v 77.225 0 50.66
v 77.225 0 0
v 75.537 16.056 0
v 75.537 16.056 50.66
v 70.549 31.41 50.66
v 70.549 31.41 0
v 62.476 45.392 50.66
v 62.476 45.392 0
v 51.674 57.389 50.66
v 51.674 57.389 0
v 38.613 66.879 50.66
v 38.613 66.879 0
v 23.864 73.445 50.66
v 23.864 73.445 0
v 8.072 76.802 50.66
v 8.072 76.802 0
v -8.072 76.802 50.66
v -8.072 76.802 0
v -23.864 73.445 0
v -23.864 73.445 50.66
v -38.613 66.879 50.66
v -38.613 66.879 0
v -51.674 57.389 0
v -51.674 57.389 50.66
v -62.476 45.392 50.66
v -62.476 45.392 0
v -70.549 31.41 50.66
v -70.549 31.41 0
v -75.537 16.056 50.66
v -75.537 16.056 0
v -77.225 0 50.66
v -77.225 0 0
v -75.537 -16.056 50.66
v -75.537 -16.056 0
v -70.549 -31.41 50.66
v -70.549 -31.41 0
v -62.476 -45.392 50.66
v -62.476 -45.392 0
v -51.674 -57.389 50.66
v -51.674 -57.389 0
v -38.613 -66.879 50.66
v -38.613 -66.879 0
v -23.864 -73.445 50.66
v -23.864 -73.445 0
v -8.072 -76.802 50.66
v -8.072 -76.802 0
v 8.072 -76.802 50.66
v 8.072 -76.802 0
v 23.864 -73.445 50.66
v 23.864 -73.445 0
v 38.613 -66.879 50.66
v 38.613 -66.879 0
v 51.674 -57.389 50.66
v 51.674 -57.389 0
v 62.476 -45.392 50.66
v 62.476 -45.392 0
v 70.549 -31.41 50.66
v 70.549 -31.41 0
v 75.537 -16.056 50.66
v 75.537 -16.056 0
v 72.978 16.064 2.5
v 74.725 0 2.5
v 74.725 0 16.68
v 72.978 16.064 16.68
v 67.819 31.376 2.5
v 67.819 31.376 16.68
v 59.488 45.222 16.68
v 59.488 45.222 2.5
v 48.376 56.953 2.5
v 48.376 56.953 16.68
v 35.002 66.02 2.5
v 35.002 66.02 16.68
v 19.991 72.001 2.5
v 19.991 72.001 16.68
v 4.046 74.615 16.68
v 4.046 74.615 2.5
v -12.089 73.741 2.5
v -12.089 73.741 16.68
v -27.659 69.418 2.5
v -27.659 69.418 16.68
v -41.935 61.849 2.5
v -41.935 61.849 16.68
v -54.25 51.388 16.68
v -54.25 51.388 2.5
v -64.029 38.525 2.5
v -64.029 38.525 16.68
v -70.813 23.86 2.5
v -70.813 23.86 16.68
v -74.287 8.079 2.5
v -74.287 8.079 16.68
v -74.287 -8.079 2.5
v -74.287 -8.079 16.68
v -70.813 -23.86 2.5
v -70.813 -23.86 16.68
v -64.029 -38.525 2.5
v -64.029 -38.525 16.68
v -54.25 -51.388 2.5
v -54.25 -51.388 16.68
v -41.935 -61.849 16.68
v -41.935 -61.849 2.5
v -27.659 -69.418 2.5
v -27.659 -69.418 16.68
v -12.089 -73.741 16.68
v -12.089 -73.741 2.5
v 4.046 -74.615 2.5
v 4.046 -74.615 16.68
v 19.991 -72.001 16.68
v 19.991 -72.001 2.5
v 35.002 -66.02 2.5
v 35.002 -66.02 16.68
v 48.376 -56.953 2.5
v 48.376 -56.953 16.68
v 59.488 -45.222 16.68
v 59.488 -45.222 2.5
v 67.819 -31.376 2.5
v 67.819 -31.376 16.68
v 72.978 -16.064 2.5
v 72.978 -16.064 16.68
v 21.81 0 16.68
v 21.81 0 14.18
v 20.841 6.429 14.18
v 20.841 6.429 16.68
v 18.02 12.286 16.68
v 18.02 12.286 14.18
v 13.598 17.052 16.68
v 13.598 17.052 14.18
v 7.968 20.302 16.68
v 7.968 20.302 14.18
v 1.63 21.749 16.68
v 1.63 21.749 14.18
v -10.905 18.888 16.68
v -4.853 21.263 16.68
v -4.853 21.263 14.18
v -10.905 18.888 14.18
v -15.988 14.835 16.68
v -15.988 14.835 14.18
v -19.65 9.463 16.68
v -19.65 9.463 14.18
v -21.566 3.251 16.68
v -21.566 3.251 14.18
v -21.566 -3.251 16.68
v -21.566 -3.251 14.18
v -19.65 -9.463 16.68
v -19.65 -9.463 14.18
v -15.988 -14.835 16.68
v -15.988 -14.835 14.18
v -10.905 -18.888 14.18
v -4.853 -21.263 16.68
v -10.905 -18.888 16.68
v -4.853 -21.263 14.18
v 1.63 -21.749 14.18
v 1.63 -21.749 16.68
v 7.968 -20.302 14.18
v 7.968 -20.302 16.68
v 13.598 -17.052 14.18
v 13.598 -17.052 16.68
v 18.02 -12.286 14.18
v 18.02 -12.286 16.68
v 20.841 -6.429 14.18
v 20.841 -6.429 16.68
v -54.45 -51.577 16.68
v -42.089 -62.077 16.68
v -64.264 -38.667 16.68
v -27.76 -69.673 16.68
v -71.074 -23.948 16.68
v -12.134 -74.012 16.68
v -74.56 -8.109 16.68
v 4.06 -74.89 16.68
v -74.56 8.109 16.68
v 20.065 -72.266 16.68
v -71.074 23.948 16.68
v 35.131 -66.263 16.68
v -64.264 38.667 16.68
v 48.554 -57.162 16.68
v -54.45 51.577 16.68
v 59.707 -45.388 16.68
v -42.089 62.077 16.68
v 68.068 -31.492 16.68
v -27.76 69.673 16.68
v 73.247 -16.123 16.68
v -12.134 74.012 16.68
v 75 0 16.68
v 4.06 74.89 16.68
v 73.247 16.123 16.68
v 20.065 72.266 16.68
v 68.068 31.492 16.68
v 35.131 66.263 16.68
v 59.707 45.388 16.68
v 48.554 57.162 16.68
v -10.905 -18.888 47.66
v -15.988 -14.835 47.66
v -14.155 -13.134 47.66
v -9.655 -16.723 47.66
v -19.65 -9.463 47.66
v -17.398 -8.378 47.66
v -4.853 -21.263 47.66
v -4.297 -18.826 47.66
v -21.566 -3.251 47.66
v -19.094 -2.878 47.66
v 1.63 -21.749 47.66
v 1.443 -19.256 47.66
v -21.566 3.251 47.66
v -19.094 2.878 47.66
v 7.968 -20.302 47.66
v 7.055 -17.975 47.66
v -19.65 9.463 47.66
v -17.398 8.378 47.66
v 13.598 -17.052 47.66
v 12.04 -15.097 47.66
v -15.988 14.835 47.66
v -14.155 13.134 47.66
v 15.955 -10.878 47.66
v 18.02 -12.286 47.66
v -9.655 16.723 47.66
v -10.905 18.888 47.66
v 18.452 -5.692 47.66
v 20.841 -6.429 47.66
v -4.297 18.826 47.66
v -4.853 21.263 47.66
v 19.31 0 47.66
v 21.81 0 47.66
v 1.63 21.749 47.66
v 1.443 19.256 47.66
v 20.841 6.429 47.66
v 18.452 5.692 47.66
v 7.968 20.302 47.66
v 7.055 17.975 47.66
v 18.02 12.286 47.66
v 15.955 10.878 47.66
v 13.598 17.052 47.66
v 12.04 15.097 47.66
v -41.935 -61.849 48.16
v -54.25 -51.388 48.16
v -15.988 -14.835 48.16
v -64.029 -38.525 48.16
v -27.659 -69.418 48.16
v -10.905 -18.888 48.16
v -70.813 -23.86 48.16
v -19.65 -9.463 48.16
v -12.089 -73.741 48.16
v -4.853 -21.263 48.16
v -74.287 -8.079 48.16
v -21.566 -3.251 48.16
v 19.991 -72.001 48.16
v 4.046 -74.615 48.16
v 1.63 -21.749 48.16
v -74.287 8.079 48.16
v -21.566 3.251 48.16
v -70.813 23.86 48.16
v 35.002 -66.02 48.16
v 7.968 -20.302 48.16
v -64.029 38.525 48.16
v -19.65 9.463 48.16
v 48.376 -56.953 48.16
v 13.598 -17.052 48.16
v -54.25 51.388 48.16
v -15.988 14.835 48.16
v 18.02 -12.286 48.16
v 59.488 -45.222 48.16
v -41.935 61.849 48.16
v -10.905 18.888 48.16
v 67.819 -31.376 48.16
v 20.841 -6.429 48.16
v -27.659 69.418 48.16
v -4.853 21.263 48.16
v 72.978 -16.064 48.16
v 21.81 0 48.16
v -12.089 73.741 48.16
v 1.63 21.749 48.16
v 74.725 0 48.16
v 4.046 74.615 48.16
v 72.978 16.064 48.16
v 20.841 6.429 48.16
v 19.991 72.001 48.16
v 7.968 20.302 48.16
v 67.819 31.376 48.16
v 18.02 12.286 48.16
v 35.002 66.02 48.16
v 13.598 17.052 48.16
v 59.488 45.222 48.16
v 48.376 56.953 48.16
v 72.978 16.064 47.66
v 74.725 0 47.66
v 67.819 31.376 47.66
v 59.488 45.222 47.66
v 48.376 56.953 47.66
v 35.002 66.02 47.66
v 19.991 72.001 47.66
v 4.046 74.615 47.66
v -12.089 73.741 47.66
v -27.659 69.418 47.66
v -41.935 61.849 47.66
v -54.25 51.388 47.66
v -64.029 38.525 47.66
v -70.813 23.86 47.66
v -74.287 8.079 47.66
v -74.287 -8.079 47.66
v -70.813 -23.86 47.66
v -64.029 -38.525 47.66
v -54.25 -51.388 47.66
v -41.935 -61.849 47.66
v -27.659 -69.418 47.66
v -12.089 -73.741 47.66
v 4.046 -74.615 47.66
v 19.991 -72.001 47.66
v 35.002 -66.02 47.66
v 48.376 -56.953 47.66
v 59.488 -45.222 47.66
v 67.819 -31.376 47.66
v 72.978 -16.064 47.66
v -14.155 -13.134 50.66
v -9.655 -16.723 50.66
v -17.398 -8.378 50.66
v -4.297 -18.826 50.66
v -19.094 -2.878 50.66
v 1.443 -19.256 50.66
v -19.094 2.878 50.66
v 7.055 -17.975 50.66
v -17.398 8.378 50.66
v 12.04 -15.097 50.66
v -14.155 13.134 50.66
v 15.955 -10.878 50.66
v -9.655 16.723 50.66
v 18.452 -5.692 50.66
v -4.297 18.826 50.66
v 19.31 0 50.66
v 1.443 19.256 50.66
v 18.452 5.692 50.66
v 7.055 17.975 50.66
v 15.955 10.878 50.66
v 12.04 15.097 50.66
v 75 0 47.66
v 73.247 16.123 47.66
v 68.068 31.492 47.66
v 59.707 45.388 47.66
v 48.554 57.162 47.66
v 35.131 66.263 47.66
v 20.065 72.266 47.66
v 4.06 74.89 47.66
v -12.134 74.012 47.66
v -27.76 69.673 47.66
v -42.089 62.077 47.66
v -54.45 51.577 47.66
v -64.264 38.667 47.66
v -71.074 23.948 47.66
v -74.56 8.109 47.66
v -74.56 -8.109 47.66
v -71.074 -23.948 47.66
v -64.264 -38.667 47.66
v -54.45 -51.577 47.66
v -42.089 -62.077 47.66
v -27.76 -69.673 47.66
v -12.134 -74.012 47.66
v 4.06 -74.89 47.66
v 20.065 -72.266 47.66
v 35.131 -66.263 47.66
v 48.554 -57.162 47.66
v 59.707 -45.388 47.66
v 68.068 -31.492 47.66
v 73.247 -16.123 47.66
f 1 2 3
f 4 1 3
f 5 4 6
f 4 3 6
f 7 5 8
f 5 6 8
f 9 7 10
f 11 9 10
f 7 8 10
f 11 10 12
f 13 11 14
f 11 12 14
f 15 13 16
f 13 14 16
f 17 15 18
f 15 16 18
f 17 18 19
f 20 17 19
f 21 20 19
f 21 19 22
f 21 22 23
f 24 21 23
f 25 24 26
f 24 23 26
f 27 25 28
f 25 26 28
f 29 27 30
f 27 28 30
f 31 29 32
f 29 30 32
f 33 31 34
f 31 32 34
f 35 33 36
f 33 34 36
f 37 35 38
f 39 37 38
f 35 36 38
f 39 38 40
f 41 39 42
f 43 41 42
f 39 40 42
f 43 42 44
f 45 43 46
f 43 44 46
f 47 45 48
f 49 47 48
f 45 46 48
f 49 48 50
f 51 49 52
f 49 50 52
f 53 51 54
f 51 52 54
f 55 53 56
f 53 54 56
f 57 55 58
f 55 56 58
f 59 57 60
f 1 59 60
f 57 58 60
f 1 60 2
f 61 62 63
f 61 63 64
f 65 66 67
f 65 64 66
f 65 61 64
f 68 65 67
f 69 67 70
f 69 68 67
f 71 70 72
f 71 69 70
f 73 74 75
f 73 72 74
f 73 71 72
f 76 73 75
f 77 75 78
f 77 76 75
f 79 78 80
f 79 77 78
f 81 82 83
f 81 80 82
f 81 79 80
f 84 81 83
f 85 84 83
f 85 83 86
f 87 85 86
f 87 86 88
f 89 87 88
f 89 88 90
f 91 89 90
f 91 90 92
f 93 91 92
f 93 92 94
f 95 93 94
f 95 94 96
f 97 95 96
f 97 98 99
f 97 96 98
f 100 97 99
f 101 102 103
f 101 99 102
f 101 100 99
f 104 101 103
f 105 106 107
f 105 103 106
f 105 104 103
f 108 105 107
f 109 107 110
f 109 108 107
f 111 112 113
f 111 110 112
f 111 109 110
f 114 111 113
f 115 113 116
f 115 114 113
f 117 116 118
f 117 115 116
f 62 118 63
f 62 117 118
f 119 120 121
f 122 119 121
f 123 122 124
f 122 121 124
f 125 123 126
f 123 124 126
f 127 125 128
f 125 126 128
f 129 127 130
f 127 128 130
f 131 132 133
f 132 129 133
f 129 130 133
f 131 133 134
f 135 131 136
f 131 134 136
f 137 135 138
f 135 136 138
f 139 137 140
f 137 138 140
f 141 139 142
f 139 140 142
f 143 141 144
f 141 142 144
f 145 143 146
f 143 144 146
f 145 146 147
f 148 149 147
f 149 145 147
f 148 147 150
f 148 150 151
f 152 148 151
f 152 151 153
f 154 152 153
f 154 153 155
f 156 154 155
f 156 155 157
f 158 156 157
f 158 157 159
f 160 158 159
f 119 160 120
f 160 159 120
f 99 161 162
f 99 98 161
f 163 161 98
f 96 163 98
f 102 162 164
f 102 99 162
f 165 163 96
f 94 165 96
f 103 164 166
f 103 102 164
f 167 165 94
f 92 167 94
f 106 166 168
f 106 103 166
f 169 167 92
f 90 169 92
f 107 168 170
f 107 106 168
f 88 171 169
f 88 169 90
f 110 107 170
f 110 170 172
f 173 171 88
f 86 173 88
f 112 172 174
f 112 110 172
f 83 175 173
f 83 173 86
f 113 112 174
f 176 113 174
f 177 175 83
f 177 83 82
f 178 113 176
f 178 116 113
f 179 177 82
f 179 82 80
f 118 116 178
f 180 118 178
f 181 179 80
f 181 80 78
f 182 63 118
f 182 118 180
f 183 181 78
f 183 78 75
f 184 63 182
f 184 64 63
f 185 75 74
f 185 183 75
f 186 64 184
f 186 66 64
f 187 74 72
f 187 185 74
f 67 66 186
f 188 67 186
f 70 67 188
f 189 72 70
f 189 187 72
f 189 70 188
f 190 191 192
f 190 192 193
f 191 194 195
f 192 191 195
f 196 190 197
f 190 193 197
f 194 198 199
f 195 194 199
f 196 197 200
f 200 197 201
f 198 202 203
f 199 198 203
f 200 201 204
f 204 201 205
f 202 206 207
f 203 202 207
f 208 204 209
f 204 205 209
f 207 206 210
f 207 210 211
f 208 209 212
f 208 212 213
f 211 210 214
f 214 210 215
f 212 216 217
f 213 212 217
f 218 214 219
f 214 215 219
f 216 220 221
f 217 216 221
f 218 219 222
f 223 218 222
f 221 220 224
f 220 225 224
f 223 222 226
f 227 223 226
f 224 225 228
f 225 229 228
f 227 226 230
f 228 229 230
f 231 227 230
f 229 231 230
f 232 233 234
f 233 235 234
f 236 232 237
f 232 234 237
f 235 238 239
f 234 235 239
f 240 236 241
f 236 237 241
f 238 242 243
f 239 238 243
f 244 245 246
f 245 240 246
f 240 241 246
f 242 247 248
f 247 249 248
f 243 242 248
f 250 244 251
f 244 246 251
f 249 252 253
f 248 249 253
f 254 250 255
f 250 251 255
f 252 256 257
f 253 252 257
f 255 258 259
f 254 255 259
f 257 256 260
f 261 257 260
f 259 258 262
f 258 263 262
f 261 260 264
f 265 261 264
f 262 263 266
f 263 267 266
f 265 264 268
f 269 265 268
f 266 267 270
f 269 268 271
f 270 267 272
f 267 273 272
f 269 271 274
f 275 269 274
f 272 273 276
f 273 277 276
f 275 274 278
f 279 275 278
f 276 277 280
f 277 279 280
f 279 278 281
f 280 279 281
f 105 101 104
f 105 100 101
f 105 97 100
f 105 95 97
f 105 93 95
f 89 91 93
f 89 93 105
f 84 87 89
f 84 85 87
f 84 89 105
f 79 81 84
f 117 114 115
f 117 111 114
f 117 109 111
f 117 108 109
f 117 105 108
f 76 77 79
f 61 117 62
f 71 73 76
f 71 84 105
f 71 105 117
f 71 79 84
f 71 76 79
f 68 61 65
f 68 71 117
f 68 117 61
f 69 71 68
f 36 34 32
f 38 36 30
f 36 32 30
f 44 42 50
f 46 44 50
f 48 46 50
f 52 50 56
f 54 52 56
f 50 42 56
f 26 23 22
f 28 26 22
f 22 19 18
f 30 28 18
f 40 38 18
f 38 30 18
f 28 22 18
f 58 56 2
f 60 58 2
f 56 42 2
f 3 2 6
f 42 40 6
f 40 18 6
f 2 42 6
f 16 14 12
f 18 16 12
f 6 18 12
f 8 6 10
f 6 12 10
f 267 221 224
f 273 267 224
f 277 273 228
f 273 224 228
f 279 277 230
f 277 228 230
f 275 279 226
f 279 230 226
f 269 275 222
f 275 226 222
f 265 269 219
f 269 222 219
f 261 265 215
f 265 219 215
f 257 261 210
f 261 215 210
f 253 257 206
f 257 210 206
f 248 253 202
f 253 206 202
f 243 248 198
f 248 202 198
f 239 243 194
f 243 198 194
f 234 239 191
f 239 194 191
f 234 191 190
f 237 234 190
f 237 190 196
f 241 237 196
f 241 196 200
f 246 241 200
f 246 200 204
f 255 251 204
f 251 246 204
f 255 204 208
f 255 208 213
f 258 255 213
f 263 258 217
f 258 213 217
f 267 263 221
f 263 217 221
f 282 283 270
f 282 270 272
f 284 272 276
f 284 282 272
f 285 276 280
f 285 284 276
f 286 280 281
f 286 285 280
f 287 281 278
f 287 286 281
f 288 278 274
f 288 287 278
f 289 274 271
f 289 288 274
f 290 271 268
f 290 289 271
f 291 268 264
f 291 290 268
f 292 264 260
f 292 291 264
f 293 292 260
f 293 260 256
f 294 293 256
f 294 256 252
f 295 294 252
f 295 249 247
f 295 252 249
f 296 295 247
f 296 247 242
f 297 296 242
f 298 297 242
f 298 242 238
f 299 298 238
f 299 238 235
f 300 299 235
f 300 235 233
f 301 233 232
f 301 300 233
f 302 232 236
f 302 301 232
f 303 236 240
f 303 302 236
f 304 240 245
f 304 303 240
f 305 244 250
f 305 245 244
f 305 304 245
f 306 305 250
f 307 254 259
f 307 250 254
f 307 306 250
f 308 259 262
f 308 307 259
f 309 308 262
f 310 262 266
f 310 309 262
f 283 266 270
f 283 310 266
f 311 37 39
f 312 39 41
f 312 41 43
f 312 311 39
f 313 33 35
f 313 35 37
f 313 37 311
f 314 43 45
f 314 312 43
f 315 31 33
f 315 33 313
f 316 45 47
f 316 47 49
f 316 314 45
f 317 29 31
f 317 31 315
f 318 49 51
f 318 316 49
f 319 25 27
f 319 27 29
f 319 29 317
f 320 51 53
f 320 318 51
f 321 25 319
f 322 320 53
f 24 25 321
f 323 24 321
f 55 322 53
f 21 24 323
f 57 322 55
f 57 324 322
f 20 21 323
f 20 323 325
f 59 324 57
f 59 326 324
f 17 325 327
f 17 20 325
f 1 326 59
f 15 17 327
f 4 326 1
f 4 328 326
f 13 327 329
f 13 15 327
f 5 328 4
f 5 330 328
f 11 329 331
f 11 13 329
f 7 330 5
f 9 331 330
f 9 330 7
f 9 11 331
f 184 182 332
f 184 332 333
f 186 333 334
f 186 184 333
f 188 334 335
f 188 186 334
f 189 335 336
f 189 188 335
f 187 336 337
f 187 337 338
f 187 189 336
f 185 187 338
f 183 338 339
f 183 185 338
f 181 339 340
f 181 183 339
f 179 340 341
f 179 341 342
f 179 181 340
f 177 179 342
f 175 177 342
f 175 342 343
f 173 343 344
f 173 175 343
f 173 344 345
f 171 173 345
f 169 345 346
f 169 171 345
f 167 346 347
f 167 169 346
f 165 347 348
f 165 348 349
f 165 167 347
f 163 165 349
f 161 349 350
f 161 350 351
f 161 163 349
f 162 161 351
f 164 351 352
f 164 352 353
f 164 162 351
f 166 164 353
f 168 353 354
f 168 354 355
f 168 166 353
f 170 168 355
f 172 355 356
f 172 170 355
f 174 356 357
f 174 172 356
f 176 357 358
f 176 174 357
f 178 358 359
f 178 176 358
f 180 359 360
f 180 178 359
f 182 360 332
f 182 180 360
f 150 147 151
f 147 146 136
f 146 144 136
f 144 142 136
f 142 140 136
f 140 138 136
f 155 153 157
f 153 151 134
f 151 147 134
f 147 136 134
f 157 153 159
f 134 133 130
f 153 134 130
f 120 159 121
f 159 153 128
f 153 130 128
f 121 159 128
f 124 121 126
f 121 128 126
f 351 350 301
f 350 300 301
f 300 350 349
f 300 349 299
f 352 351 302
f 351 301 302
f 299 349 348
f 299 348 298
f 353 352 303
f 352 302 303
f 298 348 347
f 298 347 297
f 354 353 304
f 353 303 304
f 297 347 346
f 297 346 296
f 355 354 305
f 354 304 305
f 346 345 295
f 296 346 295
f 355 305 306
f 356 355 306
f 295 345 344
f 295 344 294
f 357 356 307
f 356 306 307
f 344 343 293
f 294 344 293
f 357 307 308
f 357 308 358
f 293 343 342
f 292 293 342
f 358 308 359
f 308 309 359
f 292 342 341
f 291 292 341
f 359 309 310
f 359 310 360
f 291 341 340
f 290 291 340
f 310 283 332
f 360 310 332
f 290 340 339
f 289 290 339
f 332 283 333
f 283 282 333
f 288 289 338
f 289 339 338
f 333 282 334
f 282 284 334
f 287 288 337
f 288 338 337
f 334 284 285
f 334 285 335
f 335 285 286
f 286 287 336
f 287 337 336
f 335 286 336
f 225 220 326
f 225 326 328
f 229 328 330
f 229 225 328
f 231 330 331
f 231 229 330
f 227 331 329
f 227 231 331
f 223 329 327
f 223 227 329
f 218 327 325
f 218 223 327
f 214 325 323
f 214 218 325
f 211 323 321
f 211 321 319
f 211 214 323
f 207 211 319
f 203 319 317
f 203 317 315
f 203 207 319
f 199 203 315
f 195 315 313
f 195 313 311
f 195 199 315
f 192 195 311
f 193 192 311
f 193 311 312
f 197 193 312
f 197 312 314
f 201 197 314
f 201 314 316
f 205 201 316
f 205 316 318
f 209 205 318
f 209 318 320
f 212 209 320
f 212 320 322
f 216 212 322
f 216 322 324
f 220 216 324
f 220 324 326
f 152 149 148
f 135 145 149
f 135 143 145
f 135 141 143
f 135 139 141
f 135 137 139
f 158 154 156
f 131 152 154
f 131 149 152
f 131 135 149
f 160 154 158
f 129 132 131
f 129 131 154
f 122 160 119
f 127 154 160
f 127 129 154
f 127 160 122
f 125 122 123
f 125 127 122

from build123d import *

# Parameters (mm, degrees)
F0_R     = 19.31
F1_DEPTH = 16.68
F0_R_2   = 77.225
F2_DEPTH = 50.66
F3_T     = -2.5
F4_R     = 75
F5_DEPTH = 30.98


with BuildPart() as f1:
    # F0 (on Top) → F1 (new body)
    with BuildSketch(Plane.XY):
        Circle(F0_R)
    extrude(amount=F1_DEPTH)

    # F0 (on Top) → F2 (join)
    with BuildSketch(Plane.XY):
        Circle(F0_R_2)
        Circle(F0_R, mode=Mode.SUBTRACT)
    extrude(amount=F2_DEPTH)

    # F3 (hollow: no face is removed)
    offset(amount=F3_T, kind=Kind.INTERSECTION, mode=Mode.SUBTRACT)

    # F4 (on face) → F5 (cut)
    with BuildSketch(Plane.XY.offset(16.68)):
        Circle(F4_R)
    extrude(amount=F5_DEPTH, mode=Mode.SUBTRACT)


solid = f1.part
